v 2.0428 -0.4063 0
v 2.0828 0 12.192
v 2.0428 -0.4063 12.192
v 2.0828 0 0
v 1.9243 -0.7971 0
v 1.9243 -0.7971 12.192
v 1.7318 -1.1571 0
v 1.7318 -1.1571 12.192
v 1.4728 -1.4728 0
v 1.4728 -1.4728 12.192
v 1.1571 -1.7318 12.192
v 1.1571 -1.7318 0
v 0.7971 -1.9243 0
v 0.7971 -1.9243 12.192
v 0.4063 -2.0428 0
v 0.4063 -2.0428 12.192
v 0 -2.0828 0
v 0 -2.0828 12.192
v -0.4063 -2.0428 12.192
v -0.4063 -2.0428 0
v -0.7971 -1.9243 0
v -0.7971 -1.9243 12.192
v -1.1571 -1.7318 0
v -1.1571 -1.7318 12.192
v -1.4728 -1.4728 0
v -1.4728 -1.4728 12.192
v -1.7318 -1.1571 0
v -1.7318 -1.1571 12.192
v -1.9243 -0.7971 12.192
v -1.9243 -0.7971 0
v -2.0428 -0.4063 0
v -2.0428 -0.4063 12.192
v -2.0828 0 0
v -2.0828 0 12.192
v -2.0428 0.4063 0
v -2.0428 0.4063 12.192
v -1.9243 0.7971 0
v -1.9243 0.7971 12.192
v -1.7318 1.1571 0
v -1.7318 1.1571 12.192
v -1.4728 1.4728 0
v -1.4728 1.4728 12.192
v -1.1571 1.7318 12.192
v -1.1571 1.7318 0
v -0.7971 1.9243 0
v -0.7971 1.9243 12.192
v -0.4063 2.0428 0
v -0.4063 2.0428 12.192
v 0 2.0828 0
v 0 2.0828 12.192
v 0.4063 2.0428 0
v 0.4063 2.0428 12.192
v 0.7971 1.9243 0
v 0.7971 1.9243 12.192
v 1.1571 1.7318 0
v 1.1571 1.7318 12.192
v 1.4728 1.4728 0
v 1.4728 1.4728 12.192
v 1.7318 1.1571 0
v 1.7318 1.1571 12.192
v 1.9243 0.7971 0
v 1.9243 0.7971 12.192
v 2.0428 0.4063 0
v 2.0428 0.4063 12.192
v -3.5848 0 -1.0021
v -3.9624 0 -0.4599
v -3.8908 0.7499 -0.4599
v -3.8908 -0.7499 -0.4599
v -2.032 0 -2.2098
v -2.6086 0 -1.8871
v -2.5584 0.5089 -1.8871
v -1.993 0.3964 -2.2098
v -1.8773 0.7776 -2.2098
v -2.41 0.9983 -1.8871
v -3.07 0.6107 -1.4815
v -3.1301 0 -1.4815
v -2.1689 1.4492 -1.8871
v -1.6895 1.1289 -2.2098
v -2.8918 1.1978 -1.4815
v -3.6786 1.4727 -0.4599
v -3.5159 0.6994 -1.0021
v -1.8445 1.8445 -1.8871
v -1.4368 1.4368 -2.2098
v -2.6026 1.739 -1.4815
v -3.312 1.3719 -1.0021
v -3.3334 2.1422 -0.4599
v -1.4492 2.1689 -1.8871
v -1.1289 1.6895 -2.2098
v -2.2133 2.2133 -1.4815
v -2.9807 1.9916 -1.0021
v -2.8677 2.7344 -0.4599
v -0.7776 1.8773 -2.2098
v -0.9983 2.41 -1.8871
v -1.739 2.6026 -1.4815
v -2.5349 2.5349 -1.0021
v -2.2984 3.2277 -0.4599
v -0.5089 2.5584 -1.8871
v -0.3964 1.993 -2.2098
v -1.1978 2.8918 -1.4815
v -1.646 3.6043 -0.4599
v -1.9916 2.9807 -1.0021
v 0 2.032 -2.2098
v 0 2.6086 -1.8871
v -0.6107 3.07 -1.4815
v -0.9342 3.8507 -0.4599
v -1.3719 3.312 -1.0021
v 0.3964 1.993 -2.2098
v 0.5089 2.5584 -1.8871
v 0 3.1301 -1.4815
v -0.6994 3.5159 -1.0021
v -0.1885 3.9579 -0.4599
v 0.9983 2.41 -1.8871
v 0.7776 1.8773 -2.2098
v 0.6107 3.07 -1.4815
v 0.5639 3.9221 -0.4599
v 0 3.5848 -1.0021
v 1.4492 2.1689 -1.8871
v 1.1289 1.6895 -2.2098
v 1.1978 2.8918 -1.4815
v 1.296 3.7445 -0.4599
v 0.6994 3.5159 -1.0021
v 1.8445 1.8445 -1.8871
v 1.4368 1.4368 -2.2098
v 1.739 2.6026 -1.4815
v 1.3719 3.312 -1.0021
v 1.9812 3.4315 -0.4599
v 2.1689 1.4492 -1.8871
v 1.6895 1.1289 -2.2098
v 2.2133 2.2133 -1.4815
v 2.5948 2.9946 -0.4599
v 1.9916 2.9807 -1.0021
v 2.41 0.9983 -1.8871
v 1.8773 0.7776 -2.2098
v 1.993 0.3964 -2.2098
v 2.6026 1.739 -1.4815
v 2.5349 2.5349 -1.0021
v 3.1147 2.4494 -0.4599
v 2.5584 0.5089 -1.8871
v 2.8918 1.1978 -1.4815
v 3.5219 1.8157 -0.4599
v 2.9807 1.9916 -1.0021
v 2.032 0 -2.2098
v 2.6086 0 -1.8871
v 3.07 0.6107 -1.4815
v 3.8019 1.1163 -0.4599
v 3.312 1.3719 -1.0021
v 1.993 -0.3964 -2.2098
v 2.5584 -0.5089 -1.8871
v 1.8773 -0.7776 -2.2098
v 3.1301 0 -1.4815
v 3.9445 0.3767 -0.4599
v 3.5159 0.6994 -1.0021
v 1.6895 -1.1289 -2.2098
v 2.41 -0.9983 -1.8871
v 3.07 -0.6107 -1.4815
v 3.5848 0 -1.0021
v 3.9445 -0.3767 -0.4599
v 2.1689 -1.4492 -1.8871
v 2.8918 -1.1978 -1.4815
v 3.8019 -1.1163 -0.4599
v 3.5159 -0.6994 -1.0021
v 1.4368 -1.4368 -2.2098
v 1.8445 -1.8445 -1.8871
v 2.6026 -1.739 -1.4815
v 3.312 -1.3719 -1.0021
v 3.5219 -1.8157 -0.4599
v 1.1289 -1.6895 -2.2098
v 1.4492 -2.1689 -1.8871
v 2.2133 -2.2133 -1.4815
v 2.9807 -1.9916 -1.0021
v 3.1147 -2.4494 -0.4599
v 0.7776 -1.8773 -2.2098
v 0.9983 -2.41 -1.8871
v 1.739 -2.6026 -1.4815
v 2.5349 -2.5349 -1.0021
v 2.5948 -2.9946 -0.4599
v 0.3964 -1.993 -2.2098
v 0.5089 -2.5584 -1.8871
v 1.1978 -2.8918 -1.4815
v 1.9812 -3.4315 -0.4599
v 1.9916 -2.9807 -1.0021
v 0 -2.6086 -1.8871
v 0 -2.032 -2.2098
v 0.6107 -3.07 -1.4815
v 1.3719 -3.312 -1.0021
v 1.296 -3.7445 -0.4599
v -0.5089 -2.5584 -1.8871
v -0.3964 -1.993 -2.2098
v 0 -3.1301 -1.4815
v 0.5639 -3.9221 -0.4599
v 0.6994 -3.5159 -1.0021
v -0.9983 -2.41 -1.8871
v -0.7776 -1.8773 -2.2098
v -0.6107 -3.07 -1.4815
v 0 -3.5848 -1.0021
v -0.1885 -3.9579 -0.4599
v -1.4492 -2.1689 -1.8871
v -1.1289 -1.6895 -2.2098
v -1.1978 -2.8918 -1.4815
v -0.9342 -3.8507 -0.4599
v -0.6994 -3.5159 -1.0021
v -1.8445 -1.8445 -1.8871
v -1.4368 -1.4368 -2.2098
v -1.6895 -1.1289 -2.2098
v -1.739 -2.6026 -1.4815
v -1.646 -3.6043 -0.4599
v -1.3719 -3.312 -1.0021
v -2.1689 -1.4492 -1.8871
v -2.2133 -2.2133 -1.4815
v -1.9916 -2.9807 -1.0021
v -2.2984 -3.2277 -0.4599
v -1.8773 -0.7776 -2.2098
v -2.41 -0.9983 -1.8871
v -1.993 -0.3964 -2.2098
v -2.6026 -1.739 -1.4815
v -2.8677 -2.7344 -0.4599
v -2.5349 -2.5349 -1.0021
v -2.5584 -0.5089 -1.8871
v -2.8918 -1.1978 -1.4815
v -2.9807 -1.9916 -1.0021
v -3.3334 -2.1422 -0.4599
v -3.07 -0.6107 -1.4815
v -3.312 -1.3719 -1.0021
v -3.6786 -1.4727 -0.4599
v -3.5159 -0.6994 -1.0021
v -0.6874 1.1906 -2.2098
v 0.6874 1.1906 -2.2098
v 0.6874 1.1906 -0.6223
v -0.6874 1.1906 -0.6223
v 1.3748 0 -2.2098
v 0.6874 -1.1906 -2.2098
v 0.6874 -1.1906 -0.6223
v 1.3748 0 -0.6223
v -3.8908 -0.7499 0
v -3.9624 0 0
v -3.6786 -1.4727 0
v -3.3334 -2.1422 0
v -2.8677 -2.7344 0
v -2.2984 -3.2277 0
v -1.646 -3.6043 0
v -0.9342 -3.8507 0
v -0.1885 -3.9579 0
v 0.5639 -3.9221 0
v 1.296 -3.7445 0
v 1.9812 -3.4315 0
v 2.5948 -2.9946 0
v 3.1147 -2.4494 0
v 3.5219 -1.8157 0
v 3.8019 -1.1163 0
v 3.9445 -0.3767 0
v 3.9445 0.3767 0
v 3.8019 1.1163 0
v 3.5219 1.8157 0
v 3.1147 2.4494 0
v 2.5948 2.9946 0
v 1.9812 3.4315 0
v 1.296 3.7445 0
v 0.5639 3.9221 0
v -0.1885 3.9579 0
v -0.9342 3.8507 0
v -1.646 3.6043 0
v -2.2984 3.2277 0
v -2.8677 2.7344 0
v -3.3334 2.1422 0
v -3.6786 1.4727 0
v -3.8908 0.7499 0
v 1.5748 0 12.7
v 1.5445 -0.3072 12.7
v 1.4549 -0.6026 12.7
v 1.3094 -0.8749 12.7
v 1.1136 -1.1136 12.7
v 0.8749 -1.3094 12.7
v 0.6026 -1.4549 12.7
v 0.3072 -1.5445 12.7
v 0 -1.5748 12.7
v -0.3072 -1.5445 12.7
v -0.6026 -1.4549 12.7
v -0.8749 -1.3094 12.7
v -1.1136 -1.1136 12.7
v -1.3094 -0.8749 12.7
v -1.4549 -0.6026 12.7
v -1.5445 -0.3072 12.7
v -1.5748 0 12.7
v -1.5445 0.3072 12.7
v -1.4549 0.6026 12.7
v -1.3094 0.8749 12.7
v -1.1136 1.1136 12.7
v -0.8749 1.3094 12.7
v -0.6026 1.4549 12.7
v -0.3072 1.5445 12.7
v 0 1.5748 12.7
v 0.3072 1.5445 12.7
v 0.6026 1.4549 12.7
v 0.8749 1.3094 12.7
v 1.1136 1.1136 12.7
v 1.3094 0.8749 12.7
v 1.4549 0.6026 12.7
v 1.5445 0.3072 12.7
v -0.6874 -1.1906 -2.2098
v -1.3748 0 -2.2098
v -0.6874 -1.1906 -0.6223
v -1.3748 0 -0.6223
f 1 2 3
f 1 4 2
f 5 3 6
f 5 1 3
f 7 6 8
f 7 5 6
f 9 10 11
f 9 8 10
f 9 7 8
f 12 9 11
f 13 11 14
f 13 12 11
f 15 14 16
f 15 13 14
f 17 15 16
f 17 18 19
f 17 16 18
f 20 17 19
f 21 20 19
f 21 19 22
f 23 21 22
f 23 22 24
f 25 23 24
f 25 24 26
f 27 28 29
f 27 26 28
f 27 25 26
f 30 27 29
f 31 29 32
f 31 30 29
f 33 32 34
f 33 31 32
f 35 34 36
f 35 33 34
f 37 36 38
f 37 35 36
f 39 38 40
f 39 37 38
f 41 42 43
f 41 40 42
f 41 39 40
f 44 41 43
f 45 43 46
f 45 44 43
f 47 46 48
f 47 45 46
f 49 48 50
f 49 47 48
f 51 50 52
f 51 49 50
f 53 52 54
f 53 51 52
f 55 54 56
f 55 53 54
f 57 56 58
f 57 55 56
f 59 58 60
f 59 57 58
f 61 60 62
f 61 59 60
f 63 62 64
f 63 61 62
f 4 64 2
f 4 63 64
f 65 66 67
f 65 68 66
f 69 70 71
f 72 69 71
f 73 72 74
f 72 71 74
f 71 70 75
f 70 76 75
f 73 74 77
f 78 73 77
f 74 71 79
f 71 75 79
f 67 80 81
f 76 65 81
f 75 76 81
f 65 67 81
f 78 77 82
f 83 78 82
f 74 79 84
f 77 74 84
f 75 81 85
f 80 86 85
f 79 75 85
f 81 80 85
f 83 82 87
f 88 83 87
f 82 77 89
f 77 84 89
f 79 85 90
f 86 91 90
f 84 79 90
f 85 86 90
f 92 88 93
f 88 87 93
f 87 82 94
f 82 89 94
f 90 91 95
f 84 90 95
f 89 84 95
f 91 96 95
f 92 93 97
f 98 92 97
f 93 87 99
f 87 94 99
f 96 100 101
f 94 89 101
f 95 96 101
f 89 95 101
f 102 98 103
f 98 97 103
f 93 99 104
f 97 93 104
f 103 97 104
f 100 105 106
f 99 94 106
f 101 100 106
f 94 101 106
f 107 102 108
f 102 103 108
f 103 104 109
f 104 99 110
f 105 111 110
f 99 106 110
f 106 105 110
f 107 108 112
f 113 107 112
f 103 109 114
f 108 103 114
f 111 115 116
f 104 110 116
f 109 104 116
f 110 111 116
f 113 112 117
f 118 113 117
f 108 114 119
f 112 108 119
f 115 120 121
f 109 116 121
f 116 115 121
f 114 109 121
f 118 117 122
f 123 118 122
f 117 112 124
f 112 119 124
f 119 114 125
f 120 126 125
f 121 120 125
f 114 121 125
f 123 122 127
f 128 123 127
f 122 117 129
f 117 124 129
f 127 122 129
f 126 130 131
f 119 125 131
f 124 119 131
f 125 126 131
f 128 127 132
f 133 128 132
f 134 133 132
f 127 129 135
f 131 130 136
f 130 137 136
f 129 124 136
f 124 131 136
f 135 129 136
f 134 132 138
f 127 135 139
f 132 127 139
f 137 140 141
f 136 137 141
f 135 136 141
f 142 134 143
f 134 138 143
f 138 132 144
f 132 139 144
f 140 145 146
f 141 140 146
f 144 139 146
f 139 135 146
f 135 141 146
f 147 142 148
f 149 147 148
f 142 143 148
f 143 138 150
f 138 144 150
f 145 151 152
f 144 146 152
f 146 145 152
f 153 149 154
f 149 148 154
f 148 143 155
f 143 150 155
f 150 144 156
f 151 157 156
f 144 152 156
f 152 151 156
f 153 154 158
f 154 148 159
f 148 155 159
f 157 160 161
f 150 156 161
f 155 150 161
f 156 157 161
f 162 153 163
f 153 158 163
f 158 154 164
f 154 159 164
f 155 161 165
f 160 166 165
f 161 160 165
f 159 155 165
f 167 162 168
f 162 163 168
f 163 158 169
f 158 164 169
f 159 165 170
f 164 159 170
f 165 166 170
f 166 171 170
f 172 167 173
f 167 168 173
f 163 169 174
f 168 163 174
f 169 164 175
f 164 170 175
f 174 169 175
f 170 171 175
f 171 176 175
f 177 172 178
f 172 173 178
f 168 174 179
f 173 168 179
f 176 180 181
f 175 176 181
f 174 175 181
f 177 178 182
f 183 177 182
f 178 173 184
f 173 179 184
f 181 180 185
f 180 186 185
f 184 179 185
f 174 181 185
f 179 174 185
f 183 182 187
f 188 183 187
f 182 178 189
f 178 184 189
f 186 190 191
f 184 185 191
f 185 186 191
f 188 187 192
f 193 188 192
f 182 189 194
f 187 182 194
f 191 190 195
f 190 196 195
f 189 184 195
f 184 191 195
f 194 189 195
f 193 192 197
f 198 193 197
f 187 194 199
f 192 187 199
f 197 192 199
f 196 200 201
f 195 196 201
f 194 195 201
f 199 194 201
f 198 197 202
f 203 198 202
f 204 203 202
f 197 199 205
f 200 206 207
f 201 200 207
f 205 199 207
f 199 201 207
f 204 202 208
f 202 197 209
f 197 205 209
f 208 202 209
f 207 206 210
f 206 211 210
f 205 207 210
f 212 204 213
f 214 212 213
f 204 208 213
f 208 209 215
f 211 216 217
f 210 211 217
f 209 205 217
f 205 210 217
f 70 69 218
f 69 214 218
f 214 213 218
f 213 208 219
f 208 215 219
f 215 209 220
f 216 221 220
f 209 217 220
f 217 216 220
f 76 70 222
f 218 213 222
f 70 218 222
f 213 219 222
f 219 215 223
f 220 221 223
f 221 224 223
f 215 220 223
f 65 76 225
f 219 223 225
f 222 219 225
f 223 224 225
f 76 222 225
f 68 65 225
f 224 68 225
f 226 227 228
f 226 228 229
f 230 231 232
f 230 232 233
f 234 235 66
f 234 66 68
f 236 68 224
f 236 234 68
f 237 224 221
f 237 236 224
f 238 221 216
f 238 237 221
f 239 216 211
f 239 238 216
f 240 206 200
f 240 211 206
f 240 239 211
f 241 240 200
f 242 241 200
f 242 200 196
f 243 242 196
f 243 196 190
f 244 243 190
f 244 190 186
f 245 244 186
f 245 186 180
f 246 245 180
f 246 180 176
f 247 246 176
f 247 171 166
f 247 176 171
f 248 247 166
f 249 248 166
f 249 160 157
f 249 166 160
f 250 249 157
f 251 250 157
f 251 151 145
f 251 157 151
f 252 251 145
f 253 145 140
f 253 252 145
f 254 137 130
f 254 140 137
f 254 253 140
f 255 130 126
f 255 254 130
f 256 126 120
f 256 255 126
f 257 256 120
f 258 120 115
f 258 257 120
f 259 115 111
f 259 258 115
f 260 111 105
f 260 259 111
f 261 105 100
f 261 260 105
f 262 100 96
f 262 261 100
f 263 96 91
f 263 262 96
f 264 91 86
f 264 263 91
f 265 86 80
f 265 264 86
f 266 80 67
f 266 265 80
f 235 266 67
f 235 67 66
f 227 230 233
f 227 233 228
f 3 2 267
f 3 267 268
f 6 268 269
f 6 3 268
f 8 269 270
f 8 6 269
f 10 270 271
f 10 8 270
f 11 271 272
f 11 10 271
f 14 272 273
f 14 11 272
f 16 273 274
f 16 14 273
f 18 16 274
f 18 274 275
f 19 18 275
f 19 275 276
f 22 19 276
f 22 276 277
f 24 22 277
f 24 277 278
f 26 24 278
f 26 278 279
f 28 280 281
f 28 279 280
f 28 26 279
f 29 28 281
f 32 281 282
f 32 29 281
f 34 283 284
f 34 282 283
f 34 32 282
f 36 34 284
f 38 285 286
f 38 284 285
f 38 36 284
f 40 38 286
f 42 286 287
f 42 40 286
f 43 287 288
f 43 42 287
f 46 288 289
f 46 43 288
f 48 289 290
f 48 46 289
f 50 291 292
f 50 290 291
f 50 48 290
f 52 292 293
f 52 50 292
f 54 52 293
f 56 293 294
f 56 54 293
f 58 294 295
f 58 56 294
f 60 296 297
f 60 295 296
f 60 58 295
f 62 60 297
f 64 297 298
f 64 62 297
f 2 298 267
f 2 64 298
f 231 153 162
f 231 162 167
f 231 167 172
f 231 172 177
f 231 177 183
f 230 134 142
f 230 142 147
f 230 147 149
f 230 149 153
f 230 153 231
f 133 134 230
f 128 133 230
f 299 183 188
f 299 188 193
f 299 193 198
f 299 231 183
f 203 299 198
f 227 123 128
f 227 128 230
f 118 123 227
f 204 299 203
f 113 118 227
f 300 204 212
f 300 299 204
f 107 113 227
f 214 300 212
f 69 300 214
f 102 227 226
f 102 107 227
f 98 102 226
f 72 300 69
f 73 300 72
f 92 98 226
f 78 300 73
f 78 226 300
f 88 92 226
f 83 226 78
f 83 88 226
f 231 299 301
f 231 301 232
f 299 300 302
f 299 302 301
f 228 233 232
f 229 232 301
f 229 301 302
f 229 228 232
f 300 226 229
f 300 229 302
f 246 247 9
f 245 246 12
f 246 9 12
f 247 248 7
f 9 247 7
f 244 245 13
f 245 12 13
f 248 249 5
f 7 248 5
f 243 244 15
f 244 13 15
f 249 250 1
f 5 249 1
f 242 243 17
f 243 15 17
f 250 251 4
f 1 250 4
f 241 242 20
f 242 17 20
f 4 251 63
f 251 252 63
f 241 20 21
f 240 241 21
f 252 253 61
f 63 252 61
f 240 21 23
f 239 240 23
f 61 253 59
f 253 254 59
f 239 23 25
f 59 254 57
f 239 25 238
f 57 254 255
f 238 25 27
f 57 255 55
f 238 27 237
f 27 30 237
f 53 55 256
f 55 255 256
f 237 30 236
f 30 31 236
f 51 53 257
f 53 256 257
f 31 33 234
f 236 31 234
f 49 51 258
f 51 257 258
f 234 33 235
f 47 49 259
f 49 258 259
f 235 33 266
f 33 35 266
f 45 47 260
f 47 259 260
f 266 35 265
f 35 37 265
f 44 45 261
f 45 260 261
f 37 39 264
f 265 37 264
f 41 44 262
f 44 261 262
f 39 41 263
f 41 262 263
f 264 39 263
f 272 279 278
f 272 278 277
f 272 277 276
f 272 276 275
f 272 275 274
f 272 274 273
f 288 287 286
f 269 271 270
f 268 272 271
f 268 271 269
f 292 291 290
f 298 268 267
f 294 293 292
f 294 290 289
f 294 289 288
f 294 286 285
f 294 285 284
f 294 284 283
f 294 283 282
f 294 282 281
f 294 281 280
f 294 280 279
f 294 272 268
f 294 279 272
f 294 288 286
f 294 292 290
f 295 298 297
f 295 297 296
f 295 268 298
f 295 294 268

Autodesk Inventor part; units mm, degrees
ref_plane "YZ Plane" through (0, 0, 0) normal (1, 0, 0) x (0, 1, 0)
ref_plane "XZ Plane" through (0, 0, 0) normal (0, 1, 0) x (-1, 0, 0)
ref_plane "XY Plane" through (0, 0, 0) normal (0, 0, 1) x (1, 0, 0)
sketch "Sketch1" plane through (0, 0, 0) normal (0, 0, 1) x (1, 0, 0)
  circle A0 centre (0, 0) radius 2.0828
  dimension "d0" = 4.1656
extrude "Extrusion1" add sketch "Sketch1" along normal blind 12.7
sketch "Sketch2" plane through (0, 0, 0) normal (0, 1, 0) x (-1, 0, 0)
  line L0 (0, 0) -> (0, -2.2098)
  line L1 (0, 0) -> (3.9624, 0)
  line L2 (0, -2.2098) -> (2.032, -2.2098)
  line L3 (3.9624, 0) -> (3.9624, 3.6562) construction
  arc A0 (2.032, -2.2098) -> (3.9624, -0.4599) centre (0.1837, 1.7689) ccw
  line L4 (4.5847, 0.6553) -> (4.5847, -0.2608) construction
  line L5 (3.9624, -0.4599) -> (3.9624, 0)
  dimension "d3" = 2.2098
  dimension "d6" = 2.032
  dimension "d19" = 3.9624
revolve "Revolution1" add sketch "Sketch2" angle 360 about axis through (0, 0, 0) along (0, 0, -1)
sketch "Sketch3" plane through (0, 0, -2.2098) normal (0, 0, -1) x (-1, 0, 0)
  circle A0 centre (0, 0) radius 2.032 projected
  line L0 (-0.6874, 1.1906) -> (0.6874, 1.1906)
  line L1 (0.6874, 1.1906) -> (1.3748, 0)
  line L2 (1.3748, 0) -> (0.6874, -1.1906)
  line L3 (0.6874, -1.1906) -> (-0.6874, -1.1906)
  line L4 (-0.6874, -1.1906) -> (-1.3748, 0)
  line L5 (-1.3748, 0) -> (-0.6874, 1.1906)
  dimension "d8" = 2.3813
extrude "Extrusion2" cut sketch "Sketch3" against normal blind 1.5875 contours L0 L1 L2 L3 L4 L5
chamfer "Chamfer1" distance 0.508 angle 45 1 edges at (-2.0828, 0, 12.7)
thread "Thread1" size "8-32 UNC" class "2A" standard "ANSI Unified Screw Threads" full length
properties part number "10-32 x500 button head" material "Steel"
